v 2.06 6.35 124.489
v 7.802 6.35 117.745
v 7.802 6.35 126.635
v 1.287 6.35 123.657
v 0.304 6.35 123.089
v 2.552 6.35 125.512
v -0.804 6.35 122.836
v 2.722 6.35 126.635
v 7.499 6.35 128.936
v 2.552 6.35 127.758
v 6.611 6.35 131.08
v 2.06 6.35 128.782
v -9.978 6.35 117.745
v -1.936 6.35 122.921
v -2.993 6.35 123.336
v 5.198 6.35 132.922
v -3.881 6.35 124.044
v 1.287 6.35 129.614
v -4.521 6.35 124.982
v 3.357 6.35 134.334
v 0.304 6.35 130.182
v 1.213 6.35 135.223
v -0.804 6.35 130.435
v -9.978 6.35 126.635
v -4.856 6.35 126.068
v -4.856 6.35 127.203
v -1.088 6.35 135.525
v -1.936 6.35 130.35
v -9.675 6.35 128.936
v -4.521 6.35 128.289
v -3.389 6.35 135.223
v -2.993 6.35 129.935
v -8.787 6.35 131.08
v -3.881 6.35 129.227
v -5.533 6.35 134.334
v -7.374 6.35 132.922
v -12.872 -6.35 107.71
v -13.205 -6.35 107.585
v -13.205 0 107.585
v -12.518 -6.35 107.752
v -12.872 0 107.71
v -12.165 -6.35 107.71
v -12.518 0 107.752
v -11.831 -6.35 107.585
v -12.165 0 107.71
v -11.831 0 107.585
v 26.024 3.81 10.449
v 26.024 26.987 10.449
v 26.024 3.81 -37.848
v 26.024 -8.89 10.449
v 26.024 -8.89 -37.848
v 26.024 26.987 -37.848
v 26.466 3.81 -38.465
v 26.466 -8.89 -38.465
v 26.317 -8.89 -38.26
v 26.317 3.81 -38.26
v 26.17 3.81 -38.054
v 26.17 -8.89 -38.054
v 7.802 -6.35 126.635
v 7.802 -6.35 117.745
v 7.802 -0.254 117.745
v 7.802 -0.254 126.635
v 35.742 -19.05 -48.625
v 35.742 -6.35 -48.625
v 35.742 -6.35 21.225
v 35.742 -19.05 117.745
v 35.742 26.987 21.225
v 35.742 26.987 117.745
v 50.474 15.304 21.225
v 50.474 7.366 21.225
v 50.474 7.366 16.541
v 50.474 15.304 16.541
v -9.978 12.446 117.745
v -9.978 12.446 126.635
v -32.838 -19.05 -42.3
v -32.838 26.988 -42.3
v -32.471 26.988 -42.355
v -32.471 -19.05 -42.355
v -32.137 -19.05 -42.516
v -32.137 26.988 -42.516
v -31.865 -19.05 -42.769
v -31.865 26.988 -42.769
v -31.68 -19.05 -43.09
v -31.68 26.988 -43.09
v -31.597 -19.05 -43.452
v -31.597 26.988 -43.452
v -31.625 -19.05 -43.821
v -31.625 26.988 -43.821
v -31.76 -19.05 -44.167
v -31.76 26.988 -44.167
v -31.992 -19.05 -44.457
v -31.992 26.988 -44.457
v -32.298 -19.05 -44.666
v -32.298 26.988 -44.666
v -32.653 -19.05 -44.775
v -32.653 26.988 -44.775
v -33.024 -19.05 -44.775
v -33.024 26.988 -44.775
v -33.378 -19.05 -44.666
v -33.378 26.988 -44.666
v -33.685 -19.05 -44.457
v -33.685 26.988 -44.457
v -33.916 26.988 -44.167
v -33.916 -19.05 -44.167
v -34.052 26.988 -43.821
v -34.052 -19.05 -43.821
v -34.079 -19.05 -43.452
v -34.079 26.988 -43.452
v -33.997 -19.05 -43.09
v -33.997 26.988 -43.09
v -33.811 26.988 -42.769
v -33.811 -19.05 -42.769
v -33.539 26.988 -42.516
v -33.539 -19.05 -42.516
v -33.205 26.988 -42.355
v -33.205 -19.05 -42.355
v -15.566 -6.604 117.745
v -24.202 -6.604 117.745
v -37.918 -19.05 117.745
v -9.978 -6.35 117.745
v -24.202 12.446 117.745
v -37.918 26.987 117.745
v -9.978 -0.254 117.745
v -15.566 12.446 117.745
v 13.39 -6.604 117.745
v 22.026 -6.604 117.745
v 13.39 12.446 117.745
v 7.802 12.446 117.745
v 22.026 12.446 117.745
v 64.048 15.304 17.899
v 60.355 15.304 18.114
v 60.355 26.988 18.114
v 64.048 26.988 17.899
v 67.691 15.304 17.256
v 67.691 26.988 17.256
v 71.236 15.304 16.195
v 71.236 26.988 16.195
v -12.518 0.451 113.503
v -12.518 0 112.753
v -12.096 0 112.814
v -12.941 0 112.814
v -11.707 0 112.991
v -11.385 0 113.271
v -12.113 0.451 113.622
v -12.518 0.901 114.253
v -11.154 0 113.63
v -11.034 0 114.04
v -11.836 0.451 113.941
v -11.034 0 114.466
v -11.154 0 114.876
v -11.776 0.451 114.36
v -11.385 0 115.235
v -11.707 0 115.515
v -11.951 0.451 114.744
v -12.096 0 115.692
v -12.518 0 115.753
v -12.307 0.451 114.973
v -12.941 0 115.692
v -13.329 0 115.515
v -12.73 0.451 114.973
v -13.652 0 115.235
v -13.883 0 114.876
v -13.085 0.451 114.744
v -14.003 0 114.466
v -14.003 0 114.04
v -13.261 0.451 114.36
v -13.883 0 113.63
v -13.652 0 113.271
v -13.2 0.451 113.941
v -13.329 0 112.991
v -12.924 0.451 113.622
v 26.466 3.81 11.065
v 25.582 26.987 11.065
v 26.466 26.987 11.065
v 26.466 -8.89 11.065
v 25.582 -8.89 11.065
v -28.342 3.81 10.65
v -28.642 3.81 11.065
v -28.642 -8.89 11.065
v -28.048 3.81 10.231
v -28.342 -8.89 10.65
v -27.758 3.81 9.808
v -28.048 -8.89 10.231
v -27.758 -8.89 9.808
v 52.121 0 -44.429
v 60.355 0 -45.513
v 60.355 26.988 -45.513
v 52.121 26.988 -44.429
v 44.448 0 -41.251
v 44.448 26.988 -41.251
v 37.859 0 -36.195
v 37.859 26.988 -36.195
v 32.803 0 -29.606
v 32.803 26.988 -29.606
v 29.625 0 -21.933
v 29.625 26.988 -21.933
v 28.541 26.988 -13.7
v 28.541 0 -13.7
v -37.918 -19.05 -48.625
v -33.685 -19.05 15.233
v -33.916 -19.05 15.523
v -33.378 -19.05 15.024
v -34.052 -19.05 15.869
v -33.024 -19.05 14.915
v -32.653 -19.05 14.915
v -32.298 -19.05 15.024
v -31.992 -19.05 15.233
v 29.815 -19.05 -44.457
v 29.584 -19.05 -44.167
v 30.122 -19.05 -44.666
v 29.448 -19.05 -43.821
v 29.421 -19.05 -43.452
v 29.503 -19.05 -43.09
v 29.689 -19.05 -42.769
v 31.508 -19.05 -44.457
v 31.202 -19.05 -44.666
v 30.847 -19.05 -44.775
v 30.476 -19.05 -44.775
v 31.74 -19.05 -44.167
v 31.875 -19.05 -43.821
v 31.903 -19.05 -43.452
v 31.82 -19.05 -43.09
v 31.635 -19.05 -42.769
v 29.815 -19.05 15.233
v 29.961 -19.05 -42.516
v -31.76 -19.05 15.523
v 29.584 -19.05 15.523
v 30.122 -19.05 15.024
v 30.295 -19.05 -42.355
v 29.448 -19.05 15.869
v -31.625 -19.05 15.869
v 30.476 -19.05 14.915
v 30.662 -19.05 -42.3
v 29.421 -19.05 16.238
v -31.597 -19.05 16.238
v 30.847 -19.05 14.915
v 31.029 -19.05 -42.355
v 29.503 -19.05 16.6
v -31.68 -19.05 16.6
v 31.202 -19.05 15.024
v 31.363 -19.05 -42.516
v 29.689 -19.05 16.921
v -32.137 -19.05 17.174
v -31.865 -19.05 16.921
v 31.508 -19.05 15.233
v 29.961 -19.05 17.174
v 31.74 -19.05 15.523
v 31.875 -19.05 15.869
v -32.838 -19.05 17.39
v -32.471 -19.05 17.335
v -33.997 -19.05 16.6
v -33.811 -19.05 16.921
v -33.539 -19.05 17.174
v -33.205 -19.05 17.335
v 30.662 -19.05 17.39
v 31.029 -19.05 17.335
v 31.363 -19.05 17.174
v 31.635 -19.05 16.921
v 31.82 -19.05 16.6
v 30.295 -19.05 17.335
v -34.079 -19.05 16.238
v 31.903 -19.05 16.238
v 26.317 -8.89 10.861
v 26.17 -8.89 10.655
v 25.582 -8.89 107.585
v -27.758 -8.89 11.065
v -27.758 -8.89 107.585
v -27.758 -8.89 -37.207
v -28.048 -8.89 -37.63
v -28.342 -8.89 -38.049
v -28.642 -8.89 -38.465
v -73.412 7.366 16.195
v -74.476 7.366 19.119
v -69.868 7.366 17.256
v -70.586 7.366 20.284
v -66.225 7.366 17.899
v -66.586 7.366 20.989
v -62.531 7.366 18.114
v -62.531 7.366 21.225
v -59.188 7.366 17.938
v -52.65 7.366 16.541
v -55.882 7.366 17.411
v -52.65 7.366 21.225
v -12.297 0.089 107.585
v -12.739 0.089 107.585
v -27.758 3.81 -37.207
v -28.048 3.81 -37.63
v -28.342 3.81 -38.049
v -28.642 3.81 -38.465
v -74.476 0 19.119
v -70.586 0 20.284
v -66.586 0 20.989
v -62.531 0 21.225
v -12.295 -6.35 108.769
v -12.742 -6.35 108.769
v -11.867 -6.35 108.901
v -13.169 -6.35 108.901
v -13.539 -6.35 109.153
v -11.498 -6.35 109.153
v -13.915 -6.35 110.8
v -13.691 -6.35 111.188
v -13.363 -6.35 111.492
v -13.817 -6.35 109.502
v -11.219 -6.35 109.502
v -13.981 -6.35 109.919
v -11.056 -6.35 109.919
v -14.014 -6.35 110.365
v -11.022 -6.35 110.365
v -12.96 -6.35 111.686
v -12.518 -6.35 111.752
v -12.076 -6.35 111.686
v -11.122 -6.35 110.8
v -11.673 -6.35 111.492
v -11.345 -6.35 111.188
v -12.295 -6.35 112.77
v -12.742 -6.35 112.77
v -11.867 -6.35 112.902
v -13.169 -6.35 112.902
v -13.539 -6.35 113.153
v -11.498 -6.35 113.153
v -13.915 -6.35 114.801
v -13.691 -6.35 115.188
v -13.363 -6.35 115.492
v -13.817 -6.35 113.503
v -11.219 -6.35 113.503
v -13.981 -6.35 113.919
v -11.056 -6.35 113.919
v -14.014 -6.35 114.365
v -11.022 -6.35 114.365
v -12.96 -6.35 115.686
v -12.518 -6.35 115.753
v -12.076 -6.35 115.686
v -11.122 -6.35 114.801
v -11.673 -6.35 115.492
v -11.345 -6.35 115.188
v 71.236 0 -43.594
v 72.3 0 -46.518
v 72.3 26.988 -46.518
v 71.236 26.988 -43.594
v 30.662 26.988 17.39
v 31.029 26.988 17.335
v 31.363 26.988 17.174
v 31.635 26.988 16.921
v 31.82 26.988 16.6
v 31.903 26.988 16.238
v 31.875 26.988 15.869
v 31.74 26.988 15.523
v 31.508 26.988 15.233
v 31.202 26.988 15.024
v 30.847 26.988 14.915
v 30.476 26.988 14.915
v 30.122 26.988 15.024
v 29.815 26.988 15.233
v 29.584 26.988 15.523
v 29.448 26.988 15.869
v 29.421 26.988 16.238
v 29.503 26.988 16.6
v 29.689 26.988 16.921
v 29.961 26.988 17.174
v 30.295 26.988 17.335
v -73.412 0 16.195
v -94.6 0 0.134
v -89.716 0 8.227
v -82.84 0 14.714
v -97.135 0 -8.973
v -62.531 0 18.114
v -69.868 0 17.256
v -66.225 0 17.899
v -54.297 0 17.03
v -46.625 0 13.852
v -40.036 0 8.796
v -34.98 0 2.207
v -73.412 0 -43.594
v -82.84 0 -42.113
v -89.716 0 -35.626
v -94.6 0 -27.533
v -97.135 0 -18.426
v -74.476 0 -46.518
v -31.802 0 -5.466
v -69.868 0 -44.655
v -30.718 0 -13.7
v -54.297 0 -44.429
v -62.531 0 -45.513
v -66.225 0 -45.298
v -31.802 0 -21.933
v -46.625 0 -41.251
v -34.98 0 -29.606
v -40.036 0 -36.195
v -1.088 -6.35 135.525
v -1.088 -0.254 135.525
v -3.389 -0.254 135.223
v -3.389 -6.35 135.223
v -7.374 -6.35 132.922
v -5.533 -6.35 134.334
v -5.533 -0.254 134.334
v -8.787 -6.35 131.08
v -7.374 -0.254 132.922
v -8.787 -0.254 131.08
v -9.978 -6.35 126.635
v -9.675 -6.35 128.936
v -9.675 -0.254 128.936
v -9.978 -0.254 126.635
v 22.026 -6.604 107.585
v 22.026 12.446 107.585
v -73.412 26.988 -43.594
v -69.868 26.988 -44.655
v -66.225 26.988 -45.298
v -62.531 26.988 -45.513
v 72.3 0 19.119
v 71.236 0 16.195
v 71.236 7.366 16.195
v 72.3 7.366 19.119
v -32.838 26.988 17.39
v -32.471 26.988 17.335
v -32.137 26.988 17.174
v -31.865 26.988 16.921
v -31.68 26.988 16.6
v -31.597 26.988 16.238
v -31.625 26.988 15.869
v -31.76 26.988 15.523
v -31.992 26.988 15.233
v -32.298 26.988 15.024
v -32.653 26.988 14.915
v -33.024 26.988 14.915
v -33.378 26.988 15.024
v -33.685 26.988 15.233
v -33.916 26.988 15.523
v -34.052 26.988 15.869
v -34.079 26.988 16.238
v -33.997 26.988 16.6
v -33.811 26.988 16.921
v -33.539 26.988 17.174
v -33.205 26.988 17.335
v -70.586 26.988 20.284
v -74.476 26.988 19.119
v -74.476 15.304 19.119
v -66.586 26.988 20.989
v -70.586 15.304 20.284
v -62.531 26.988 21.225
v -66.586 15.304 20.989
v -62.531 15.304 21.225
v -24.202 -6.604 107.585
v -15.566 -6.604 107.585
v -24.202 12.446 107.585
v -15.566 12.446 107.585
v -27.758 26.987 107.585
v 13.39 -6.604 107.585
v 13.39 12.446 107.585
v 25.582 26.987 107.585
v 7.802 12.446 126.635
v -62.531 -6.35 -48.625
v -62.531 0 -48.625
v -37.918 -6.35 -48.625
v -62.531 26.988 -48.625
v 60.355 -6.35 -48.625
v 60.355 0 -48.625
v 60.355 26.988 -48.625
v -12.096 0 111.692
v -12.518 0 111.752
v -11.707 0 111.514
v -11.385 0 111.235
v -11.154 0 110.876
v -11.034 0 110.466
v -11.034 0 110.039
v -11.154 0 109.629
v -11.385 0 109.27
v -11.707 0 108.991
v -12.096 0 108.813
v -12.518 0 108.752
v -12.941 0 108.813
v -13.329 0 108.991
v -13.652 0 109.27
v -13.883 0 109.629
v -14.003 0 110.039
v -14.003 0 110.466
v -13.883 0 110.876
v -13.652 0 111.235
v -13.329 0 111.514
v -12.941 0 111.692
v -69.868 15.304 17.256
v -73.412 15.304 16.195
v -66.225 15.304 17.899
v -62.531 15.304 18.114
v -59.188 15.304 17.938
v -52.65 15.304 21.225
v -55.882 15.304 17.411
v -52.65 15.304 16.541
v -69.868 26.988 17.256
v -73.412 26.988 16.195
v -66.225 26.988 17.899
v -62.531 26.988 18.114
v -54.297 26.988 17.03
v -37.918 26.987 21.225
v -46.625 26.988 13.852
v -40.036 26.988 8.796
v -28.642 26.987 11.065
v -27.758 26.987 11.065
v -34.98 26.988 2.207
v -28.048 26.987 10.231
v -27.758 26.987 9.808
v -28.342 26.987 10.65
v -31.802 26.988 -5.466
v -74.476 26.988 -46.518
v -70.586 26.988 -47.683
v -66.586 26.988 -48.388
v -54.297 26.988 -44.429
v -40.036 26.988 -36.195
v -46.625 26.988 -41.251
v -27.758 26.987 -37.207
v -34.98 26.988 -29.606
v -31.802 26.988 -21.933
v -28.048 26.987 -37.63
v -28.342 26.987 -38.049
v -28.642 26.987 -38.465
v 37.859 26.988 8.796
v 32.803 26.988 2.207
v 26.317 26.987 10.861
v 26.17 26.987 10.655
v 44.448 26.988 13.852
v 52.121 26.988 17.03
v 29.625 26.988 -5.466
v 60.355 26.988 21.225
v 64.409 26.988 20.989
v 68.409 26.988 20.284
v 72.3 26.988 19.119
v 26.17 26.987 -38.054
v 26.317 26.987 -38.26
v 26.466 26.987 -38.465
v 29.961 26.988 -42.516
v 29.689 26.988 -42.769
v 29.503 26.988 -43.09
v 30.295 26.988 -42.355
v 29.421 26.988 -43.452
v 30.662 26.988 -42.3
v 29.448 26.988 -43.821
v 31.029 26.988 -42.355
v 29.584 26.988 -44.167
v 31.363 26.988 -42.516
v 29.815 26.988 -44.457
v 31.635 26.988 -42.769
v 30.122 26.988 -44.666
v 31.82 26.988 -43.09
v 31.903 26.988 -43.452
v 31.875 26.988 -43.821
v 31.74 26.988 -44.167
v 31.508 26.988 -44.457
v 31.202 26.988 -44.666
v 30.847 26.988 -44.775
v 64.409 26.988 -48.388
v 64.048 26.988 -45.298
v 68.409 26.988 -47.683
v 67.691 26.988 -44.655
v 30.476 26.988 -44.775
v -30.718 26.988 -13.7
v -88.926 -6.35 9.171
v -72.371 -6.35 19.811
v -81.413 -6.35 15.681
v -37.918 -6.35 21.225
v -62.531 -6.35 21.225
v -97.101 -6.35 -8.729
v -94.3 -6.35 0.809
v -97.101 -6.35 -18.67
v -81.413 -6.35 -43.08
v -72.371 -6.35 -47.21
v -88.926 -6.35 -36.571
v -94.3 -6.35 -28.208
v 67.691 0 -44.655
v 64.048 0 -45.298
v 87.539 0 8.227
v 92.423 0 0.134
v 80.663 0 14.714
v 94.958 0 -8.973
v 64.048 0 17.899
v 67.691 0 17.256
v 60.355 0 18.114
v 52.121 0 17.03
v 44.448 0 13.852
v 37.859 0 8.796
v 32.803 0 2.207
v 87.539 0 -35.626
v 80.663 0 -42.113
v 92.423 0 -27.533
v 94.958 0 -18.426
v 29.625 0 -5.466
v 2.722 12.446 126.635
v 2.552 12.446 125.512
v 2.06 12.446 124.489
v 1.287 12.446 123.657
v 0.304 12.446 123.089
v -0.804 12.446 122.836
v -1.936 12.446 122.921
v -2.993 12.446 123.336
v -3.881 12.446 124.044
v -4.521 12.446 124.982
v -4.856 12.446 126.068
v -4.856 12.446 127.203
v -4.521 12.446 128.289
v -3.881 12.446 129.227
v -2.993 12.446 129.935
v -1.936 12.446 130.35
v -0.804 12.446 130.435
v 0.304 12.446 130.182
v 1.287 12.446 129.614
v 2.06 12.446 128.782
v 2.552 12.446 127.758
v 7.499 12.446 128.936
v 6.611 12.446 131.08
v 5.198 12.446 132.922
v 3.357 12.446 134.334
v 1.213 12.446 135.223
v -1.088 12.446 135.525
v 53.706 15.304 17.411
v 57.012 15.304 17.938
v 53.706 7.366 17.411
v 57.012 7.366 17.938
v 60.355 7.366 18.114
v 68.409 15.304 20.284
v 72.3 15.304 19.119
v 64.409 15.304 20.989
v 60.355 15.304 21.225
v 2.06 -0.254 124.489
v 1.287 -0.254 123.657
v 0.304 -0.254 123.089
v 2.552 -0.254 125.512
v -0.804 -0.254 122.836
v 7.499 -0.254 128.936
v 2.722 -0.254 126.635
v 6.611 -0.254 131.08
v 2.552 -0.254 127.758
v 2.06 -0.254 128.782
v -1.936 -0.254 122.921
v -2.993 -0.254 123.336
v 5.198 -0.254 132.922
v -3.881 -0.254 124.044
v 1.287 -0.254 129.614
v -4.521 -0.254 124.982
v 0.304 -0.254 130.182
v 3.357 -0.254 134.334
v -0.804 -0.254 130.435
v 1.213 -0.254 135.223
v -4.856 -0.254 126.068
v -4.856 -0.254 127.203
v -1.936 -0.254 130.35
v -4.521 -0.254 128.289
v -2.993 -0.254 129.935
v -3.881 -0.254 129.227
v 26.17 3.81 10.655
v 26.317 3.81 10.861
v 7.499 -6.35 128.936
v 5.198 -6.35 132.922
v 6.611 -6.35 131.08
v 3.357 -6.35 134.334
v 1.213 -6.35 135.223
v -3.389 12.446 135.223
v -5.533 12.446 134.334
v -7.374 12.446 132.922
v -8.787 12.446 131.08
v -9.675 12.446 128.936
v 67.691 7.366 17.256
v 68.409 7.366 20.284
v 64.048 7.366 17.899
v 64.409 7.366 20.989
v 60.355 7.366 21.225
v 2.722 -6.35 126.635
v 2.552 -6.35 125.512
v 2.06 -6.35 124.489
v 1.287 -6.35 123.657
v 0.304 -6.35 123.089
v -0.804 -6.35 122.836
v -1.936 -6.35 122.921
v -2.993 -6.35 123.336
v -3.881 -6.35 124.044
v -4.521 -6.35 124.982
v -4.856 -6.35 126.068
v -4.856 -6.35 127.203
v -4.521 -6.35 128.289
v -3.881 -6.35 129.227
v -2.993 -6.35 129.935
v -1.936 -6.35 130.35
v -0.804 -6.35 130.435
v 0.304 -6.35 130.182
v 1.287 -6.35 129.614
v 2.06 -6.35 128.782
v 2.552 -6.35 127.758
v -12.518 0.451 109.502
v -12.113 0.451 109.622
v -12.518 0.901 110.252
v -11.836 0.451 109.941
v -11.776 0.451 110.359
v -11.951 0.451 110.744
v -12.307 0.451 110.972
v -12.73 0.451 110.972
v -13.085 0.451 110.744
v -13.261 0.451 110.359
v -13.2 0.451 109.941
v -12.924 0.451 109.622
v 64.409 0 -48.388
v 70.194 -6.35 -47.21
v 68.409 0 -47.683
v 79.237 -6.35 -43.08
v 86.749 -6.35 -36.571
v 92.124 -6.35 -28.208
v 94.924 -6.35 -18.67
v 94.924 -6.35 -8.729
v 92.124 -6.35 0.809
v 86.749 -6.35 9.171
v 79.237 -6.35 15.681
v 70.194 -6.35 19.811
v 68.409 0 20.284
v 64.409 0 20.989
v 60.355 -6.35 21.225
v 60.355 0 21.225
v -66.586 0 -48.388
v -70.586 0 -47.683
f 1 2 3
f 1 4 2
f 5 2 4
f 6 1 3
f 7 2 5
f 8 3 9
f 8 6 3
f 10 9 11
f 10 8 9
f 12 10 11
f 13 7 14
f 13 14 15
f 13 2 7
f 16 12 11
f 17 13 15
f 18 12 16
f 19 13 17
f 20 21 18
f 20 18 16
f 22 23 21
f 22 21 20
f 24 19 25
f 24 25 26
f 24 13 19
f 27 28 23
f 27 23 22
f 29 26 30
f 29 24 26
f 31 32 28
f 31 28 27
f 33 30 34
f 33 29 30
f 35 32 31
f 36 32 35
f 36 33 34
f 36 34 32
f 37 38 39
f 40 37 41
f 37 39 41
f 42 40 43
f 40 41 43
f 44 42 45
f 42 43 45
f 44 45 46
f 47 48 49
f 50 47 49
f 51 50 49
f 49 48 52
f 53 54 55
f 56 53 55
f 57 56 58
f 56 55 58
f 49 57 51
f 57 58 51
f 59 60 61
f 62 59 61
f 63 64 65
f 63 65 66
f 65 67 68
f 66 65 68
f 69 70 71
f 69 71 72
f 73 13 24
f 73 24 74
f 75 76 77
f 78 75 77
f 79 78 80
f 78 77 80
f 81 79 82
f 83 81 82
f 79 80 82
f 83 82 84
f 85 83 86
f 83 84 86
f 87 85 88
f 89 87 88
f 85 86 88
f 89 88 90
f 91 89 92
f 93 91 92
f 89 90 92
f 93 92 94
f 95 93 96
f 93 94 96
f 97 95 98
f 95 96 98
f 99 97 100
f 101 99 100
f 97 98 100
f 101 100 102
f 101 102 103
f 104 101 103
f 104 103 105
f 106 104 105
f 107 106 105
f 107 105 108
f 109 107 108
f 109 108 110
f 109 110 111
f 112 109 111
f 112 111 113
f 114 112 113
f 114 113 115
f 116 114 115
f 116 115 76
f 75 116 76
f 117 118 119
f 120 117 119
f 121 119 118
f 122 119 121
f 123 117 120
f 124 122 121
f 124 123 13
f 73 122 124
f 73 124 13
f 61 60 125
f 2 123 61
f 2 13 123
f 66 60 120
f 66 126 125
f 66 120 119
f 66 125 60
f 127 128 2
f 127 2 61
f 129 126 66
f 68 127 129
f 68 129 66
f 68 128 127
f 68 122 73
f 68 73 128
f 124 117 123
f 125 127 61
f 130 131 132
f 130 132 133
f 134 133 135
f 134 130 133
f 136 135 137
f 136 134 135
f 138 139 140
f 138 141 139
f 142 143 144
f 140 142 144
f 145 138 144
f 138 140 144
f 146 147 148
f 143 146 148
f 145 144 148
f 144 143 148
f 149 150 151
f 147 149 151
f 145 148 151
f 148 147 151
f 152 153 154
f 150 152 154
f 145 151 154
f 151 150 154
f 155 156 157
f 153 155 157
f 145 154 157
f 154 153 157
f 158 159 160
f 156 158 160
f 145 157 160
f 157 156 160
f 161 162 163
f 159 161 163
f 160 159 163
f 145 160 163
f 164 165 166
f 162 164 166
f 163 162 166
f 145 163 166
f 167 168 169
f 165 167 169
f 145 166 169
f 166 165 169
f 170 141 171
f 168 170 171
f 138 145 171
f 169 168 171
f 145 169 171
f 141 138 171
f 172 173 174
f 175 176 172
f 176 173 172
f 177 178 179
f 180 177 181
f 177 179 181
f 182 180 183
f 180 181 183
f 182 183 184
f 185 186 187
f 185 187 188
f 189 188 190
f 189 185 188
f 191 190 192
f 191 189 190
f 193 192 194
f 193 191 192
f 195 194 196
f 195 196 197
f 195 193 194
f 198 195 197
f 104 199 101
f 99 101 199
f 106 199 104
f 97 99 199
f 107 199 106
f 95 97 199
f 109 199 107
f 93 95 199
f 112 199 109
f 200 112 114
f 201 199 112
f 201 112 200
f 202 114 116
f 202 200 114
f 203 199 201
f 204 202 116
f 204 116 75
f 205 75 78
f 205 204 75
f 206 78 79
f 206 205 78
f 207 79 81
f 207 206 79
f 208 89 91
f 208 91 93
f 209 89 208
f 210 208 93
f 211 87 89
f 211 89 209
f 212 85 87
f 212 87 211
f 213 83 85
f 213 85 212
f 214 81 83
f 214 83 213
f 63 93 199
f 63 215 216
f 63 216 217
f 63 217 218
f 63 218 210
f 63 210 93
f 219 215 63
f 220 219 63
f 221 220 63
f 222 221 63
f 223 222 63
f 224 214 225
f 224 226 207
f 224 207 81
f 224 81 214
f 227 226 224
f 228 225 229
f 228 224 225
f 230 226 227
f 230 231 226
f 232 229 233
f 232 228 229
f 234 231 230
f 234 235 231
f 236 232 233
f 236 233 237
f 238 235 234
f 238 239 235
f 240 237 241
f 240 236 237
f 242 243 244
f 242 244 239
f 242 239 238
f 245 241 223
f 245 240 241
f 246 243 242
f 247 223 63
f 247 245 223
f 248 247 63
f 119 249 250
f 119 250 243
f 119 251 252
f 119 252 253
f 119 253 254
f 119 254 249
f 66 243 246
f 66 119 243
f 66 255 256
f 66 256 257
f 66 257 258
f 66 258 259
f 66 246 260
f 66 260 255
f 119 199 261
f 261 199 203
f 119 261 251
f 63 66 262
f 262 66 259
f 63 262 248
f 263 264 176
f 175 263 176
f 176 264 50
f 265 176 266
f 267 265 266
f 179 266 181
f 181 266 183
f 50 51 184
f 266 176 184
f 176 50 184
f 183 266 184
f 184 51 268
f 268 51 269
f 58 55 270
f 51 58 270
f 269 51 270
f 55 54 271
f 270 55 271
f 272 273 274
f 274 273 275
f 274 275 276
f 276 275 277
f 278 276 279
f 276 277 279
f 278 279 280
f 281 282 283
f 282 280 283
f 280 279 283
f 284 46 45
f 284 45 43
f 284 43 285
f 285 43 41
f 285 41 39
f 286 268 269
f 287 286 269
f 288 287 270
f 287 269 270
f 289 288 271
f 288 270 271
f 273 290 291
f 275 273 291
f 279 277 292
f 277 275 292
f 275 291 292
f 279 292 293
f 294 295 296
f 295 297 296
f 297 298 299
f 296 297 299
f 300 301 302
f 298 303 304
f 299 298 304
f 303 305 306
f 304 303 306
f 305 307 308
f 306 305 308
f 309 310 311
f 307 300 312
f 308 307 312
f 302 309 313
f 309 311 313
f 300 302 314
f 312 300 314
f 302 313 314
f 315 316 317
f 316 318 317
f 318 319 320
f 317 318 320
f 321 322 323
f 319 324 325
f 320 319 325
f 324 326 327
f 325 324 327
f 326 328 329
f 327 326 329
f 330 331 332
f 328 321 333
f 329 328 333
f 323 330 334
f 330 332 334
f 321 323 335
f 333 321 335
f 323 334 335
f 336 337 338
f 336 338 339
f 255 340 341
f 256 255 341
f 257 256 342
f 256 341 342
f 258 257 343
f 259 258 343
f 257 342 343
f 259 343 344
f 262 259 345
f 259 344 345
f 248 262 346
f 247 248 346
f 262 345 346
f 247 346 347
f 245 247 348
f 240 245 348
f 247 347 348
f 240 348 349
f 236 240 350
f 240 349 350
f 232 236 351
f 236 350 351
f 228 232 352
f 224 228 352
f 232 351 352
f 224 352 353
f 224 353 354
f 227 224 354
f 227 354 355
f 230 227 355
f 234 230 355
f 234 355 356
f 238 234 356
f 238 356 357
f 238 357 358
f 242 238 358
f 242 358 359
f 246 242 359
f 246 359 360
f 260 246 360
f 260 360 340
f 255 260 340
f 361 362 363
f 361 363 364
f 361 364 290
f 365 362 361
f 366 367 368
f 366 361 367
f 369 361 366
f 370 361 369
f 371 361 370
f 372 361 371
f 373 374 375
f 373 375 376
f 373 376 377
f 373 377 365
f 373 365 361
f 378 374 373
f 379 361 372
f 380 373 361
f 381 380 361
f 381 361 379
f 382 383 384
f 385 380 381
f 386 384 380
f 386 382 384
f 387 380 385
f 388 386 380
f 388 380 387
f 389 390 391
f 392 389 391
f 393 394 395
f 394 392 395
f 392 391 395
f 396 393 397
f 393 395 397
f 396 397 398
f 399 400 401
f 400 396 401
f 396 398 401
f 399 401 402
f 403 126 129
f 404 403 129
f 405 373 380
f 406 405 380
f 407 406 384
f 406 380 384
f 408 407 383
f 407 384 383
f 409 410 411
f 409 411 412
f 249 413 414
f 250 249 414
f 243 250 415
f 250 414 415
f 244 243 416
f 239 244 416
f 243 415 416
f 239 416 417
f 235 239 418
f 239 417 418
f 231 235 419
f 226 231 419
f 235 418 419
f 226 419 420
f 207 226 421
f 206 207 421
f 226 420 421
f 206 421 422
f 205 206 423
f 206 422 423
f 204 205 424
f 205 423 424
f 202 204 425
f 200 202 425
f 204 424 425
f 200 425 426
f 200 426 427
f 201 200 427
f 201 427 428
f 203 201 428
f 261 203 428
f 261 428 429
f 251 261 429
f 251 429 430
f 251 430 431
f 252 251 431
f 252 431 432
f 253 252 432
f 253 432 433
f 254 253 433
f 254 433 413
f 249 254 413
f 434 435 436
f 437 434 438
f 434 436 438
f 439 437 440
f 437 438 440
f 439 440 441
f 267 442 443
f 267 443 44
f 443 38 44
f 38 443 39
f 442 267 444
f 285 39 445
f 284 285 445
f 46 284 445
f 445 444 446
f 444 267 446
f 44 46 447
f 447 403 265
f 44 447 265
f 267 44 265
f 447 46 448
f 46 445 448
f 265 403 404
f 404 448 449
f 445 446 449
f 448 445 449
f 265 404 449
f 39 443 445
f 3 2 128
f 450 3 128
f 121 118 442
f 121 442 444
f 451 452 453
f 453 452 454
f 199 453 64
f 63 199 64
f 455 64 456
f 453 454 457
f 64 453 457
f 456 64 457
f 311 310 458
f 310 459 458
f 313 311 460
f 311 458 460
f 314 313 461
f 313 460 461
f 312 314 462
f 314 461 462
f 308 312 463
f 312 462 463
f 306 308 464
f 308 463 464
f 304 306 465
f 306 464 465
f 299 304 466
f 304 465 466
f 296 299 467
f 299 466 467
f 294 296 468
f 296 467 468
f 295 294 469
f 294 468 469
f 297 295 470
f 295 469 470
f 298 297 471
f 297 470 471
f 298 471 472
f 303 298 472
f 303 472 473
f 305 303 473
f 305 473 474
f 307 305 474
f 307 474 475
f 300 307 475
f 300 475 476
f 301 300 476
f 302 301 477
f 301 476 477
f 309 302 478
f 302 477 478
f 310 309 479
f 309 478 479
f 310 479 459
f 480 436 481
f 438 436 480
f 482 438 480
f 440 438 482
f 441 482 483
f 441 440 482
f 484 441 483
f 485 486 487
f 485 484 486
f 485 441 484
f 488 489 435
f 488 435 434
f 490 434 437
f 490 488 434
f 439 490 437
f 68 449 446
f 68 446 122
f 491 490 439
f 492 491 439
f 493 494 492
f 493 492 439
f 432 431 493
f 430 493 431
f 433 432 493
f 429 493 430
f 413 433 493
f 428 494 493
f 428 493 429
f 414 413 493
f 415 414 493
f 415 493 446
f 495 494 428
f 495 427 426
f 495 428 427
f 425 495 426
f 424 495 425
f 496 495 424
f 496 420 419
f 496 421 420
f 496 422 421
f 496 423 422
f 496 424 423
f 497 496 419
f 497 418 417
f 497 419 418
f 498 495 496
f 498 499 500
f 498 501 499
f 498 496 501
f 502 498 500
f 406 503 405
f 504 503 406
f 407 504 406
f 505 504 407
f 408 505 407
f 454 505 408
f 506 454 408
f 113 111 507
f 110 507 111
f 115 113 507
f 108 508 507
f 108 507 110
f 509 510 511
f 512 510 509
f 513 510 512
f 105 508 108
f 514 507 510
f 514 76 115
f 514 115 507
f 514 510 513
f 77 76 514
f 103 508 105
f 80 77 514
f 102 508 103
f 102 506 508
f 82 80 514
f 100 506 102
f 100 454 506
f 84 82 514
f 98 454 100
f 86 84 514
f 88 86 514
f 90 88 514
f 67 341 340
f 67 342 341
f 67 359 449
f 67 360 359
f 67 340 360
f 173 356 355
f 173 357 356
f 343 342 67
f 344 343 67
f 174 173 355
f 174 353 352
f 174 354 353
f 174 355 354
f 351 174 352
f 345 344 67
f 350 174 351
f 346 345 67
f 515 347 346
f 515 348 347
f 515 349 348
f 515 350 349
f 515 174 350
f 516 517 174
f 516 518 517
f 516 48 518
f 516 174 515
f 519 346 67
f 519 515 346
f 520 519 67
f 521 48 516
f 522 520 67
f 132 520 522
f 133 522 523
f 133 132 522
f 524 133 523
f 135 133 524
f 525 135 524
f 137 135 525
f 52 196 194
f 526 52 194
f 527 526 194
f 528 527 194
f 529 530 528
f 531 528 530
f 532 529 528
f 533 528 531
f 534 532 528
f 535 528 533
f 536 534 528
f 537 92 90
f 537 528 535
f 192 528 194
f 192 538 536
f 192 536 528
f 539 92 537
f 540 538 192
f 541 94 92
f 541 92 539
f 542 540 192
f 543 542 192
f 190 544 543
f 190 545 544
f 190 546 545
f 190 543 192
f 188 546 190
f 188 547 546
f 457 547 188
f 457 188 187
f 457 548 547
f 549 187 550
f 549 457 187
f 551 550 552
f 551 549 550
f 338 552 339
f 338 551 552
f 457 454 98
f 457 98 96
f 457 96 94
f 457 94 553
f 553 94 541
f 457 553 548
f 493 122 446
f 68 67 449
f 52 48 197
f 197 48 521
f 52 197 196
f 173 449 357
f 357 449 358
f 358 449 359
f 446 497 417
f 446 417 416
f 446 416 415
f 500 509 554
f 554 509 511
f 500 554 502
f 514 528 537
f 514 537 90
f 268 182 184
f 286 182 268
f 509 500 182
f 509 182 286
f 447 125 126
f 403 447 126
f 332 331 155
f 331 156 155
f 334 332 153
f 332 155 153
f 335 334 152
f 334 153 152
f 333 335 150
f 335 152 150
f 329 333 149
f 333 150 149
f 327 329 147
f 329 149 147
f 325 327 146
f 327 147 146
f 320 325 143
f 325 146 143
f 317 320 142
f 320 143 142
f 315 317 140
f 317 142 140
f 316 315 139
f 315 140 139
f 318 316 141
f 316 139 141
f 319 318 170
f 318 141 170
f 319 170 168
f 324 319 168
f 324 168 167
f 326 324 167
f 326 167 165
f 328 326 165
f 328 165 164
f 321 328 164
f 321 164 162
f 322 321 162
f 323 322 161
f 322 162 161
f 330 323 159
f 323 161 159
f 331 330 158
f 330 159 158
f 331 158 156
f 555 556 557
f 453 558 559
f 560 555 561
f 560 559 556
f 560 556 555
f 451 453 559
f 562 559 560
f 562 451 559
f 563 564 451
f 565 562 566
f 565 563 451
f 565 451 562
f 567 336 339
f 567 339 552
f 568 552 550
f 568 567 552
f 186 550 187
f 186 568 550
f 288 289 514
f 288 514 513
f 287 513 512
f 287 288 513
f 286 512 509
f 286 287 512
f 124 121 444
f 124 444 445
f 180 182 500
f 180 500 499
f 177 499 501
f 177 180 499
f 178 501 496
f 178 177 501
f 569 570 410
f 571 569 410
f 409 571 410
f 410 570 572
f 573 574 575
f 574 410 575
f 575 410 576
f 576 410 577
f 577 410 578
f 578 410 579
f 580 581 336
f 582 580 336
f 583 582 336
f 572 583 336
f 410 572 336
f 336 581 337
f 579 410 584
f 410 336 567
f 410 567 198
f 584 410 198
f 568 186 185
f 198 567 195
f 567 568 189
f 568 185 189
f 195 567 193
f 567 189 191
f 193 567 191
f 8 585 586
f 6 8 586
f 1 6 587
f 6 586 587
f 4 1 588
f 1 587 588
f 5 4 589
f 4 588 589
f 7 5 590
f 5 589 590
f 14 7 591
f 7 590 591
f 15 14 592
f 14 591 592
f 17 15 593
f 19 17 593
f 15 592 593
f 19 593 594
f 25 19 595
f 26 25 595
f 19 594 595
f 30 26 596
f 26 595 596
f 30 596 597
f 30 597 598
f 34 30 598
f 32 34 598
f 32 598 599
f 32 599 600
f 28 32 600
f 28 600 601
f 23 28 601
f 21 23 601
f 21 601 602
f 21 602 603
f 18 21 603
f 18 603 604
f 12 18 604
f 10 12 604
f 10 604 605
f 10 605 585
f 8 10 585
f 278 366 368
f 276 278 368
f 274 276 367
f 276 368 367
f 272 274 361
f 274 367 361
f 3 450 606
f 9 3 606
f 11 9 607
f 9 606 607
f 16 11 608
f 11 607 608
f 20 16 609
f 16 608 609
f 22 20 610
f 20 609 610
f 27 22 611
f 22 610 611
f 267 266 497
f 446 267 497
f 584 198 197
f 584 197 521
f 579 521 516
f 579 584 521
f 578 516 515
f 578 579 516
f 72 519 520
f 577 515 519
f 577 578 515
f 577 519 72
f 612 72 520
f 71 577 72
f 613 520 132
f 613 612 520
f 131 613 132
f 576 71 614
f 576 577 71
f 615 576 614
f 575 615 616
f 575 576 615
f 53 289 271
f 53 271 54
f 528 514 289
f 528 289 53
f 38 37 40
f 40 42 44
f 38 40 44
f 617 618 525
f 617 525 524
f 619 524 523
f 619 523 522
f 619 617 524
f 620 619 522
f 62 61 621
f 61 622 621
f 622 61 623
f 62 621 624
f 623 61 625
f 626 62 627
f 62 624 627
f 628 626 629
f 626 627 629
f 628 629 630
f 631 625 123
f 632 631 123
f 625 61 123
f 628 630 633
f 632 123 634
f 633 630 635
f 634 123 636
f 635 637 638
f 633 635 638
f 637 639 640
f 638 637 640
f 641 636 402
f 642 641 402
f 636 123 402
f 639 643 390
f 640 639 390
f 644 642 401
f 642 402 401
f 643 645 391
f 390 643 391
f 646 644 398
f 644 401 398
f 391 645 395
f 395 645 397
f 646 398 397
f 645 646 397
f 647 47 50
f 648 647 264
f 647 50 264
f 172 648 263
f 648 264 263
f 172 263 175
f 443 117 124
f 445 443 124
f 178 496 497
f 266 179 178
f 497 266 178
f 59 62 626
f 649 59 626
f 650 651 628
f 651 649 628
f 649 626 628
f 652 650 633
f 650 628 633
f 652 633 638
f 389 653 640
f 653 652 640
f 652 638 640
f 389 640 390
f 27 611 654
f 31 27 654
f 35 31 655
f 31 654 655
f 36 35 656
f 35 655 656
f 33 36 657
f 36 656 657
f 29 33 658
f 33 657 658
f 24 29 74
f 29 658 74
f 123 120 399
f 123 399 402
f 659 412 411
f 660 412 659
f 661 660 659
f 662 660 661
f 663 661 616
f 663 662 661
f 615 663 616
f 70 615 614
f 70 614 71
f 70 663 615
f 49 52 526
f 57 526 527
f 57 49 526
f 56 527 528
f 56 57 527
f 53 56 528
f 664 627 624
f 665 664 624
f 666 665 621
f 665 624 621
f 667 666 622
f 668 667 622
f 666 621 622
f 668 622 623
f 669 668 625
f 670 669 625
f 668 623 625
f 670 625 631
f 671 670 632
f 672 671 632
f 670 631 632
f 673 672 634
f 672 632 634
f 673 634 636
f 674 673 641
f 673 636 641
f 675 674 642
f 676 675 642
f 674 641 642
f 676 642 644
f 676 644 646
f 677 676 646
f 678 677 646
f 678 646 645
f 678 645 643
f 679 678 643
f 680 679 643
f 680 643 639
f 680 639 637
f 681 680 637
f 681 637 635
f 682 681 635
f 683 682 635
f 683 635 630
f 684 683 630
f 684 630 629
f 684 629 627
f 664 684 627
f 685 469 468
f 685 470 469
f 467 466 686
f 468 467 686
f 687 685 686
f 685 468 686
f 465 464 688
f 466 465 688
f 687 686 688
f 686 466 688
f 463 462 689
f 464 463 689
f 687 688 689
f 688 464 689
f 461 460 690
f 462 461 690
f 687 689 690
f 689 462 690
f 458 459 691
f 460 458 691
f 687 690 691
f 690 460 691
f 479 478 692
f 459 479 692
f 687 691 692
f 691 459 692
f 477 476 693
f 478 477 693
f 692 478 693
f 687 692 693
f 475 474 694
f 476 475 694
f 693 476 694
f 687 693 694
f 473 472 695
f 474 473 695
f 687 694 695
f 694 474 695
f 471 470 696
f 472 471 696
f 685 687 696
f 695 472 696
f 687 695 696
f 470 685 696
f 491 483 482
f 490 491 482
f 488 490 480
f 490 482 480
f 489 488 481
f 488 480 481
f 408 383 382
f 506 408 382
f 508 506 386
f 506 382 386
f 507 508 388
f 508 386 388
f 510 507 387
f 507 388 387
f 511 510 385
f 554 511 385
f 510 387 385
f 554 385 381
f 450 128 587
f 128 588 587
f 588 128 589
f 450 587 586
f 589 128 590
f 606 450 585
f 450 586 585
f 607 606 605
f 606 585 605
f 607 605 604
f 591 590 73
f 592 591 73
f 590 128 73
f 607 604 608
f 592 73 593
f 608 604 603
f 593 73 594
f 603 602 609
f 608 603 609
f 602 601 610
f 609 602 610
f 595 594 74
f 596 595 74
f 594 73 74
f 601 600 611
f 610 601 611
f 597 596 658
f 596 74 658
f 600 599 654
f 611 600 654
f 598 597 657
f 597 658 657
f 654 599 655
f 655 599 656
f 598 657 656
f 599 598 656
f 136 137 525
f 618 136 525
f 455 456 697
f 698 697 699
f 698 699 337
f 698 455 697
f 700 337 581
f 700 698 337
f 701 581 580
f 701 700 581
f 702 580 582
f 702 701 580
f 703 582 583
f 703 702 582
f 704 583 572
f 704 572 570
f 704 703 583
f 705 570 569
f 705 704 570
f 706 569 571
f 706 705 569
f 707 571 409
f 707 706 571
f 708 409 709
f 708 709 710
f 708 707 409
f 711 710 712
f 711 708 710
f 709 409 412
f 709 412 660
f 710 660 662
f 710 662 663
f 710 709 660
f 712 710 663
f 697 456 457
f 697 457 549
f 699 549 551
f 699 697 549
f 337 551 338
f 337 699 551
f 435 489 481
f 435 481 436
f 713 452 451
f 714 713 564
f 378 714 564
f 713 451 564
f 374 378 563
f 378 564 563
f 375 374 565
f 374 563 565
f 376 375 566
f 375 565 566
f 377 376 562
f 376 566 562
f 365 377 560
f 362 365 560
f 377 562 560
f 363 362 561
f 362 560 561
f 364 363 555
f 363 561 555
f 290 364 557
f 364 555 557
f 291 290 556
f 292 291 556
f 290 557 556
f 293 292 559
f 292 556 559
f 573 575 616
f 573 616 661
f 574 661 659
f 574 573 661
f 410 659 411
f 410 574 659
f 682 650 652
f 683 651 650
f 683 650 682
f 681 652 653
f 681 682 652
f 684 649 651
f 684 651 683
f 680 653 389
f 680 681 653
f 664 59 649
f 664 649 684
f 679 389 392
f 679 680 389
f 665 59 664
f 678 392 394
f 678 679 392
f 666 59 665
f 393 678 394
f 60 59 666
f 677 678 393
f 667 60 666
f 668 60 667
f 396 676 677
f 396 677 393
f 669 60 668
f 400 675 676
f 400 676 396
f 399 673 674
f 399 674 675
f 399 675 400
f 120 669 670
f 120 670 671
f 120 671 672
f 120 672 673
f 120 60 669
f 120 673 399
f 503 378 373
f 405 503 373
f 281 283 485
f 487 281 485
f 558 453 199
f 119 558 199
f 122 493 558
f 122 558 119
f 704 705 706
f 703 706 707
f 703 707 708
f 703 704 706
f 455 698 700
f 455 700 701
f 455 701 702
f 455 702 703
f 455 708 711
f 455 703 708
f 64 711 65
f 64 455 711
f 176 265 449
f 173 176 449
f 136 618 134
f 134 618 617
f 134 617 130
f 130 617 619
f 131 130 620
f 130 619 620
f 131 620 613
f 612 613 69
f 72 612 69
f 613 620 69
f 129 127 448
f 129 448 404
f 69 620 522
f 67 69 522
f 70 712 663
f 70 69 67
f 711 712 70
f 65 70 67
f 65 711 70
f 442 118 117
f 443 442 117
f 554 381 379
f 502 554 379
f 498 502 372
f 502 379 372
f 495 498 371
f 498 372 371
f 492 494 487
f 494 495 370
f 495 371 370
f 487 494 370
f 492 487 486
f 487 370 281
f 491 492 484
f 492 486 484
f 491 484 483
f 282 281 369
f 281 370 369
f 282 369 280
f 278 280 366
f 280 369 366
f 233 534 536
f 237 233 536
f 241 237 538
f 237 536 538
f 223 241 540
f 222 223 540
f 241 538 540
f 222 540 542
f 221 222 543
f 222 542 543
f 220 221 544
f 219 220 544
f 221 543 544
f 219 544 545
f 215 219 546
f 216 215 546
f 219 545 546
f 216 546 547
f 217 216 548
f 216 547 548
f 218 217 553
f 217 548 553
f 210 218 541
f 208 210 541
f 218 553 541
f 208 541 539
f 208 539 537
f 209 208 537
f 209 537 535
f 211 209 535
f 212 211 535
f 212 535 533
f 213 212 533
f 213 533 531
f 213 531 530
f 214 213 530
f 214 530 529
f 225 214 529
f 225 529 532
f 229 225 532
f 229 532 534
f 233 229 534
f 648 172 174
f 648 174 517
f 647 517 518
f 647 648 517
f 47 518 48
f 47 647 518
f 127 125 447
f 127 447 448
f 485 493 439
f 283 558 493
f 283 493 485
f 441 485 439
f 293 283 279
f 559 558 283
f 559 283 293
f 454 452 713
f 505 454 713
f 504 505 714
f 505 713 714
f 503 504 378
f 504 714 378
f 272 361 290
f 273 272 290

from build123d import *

# Parameters (mm, degrees)
BOSS_EXTRUDE1_DEPTH          = 26.9875
BOSS_EXTRUDE5_START          = -6.35
BOSS_EXTRUDE5_DEPTH          = 6.35
SKETCH3_W                    = 36.83
SKETCH3_H                    = 33.3375
BOSS_EXTRUDE7_DEPTH          = 96.52
SKETCH6_W                    = 8.89
SKETCH6_H                    = 33.3375
BOSS_EXTRUDE8_DEPTH          = 17.78
SKETCH7_W                    = 17.78
SKETCH7_H                    = 14.5415
SKETCH7_H_2                  = 6.604
CUT_EXTRUDE1_DEPTH           = 21.082
CUT_EXTRUDE2_DEPTH           = 30.48
F_3_0_3_DIAMETER_HOLE1_D     = 3
F_3_0_3_DIAMETER_HOLE1_DEPTH = 6.35
F_3_0_3_DIAMETER_HOLE1_TIP   = 0.901290929
SKETCH11_W                   = 25.093710248
SKETCH11_H                   = 7.9375
CUT_EXTRUDE3_DEPTH           = 13.716
SHELL1_START                 = -38.464523808
SHELL1_OUTLINE_W             = 53.34
SHELL1_OUTLINE_H             = 23.1775
SHELL1_DEPTH                 = 146.05
SHELL1_START_2               = 3.81
SHELL1_3_DEPTH               = 23.1775
SHELL1_4_DEPTH               = 23.1775
SKETCH14_W                   = 53.34
SKETCH14_H                   = 23.1775
CUT_EXTRUDE5_DEPTH           = 18.288
SKETCH16_W                   = 73.66
SKETCH16_H                   = 166.37
BOSS_EXTRUDE9_DEPTH          = 12.7
CUT_EXTRUDE6_START           = -12.7
CUT_EXTRUDE6_DEPTH           = 12.7
SKETCH18_W                   = 8.636
SKETCH18_H                   = 19.05
CUT_EXTRUDE7_DEPTH           = 20.828
SKETCH13_R                   = 1.2446
CUT_EXTRUDE4_DEPTH           = 50.8
SKETCH20_W                   = 53.781966305
SKETCH20_H                   = 49.53
CUT_EXTRUDE8_DEPTH           = 35.8775


with BuildPart() as part:
    # Sketch1 → Boss-Extrude1 (new body)
    with BuildSketch(Plane(origin=(0, 0, 0), x_dir=(1, 0, 0), z_dir=(0, 1, 0))):
        with BuildLine():
            ThreePointArc((-27.606252307, 13.699523808), (-37.835547974, 38.395228141), (-62.531252307, 48.624523808))
            Line((-62.531252307, 48.624523808), (-62.531252307, 45.513023808))
            ThreePointArc((-62.531252307, 45.513023808), (-40.035710723, 36.195065391), (-30.717752307, 13.699523808))
            ThreePointArc((-30.717752307, 13.699523808), (-40.035710723, -8.796017775), (-62.531252307, -18.113976192))
            Line((-62.531252307, -18.113976192), (-62.531252307, -21.225476192))
            ThreePointArc((-62.531252307, -21.225476192), (-37.835547974, -10.996180525), (-27.606252307, 13.699523808))
        make_face()
        with BuildLine():
            Line((-62.531252307, 45.513023808), (-62.531252307, 48.624523808))
            ThreePointArc((-62.531252307, 48.624523808), (-68.595914912, 48.093934582), (-74.476305812, 46.518288589))
            Line((-74.476305812, 46.518288589), (-73.412110136, 43.594434999))
            ThreePointArc((-73.412110136, 43.594434999), (-68.055608607, 45.029705258), (-62.531252307, 45.513023808))
        make_face()
        with BuildLine():
            ThreePointArc((-74.476305812, -19.119240973), (-68.595914912, -20.694886966), (-62.531252307, -21.225476192))
            Line((-62.531252307, -21.225476192), (-62.531252307, -18.113976192))
            ThreePointArc((-62.531252307, -18.113976192), (-68.055608607, -17.630657643), (-73.412110136, -16.195387383))
            Line((-73.412110136, -16.195387383), (-74.476305812, -19.119240973))
        make_face()
        with BuildLine():
            Line((-1.088243621, 48.624523808), (-62.531252307, 48.624523808))
            ThreePointArc((-62.531252307, 48.624523808), (-37.835547974, 38.395228141), (-27.606252307, 13.699523808))
            ThreePointArc((-27.606252307, 13.699523808), (-37.835547974, -10.996180525), (-62.531252307, -21.225476192))
            Line((-62.531252307, -21.225476192), (-1.088243621, -21.225476192))
            Line((-1.088243621, -21.225476192), (-1.088243621, 48.624523808))
        make_face()
    boss_extrude1 = extrude(amount=BOSS_EXTRUDE1_DEPTH)

    # Sketch1<5> → Boss-Extrude5 (add)
    with BuildSketch(Plane(origin=(0, 0, 0), x_dir=(1, 0, 0), z_dir=(0, 1, 0)).offset(BOSS_EXTRUDE5_START)):
        with BuildLine():
            Line((-62.531252307, -21.225476192), (-1.088243621, -21.225476192))
            Line((-1.088243621, -21.225476192), (-1.088243621, 48.624523808))
            Line((-1.088243621, 48.624523808), (-62.531252307, 48.624523808))
            ThreePointArc((-62.531252307, 48.624523808), (-97.456252307, 13.699523808), (-62.531252307, -21.225476192))
        make_face()
    boss_extrude5 = extrude(amount=BOSS_EXTRUDE5_DEPTH)

    # Mirror1: Boss-Extrude1, Boss-Extrude5 across plane
    add(boss_extrude1.mirror(Plane(origin=(-1.088243621, 26.9875, 0), x_dir=(0, 0, 1), z_dir=(1, 0, 0))))
    add(boss_extrude5.mirror(Plane(origin=(-1.088243621, 26.9875, 0), x_dir=(0, 0, 1), z_dir=(1, 0, 0))))

    # Sketch3 → Boss-Extrude7 (add)
    with BuildSketch(Plane.XY.offset(21.225476192)):
        with Locations((-19.503243621, 10.31875)):
            Rectangle(SKETCH3_W, SKETCH3_H)
        with Locations((17.326756379, 10.31875)):
            Rectangle(SKETCH3_W, SKETCH3_H)
    extrude(amount=BOSS_EXTRUDE7_DEPTH)

    # Sketch6 → Boss-Extrude8 (add)
    with BuildSketch(Plane.XY.offset(117.745476192)):
        with Locations((-5.533243621, 10.31875)):
            Rectangle(SKETCH6_W, SKETCH6_H)
        with Locations((3.356756379, 10.31875)):
            Rectangle(SKETCH6_W, SKETCH6_H)
    extrude(amount=BOSS_EXTRUDE8_DEPTH)

    # Sketch7 → Cut-Extrude1 (cut)
    with BuildSketch(Plane.ZY.offset(9.978243621)):
        with Locations((126.635476192, 19.71675)):
            Rectangle(SKETCH7_W, SKETCH7_H)
        with Locations((126.635476192, 3.048)):
            Rectangle(SKETCH7_W, SKETCH7_H_2)
    extrude(amount=-CUT_EXTRUDE1_DEPTH, mode=Mode.SUBTRACT)

    # Sketch8 → Cut-Extrude2 (cut)
    with BuildSketch(Plane(origin=(0, 12.446, 0), x_dir=(1, 0, 0), z_dir=(0, 1, 0))):
        with BuildLine():
            Line((-9.978243621, -135.525476192), (-1.088243621, -135.525476192))
            ThreePointArc((-1.088243621, -135.525476192), (-7.374422906, -132.921655477), (-9.978243621, -126.635476192))
            Line((-9.978243621, -126.635476192), (-9.978243621, -135.525476192))
        make_face()
        with BuildLine():
            Line((7.801756379, -135.525476192), (7.801756379, -126.635476192))
            ThreePointArc((7.801756379, -126.635476192), (5.197935664, -132.921655477), (-1.088243621, -135.525476192))
            Line((-1.088243621, -135.525476192), (7.801756379, -135.525476192))
        make_face()
        with BuildLine():
            ThreePointArc((-4.898243621, -126.635476192), (-1.088243621, -130.445476192), (2.721756379, -126.635476192))
            Line((2.721756379, -126.635476192), (-4.898243621, -126.635476192))
        make_face()
        with BuildLine():
            Line((-4.898243621, -126.635476192), (2.721756379, -126.635476192))
            ThreePointArc((2.721756379, -126.635476192), (-1.088243621, -122.825476192), (-4.898243621, -126.635476192))
        make_face()
    extrude(amount=-CUT_EXTRUDE2_DEPTH, mode=Mode.SUBTRACT)

    # Ø3.0 (3) Diameter Hole1
    with Locations(Plane(origin=(-12.518243621, -6.35, 114.252976192), x_dir=(0, 0, -1), z_dir=(0, -1, 0))):
        with Locations((0, 0), (4.0005, 0), (8.001, 0)):
            Hole(F_3_0_3_DIAMETER_HOLE1_D / 2, depth=F_3_0_3_DIAMETER_HOLE1_DEPTH)
            with Locations((0, 0, -(F_3_0_3_DIAMETER_HOLE1_DEPTH + F_3_0_3_DIAMETER_HOLE1_TIP / 2))):  # 118° drill point
                Cone(0, F_3_0_3_DIAMETER_HOLE1_D / 2, F_3_0_3_DIAMETER_HOLE1_TIP, mode=Mode.SUBTRACT)

    # Sketch11 → Cut-Extrude3 (cut)
    with BuildSketch(Plane.XY.offset(21.225476192)):
        with Locations((-65.197098745, 11.33475)):
            Rectangle(SKETCH11_W, SKETCH11_H)
    cut_extrude3 = extrude(amount=-CUT_EXTRUDE3_DEPTH, mode=Mode.SUBTRACT)

    # Mirror2: Cut-Extrude3 across plane
    add(cut_extrude3.mirror(Plane.ZY.offset(1.088243621)), mode=Mode.SUBTRACT)

    # Shell1: read off the stored shape, not the designer's step
    # Shell1 outline → Shell1 (cut)
    with BuildSketch(Plane.XY.offset(SHELL1_START)):
        with Locations((-1.088243621, 15.39875)):
            Rectangle(SHELL1_OUTLINE_W, SHELL1_OUTLINE_H)
    extrude(amount=SHELL1_DEPTH, mode=Mode.SUBTRACT)

    # Shell1 2 outline → Shell1 2 (revolve)
    with BuildSketch(Plane(origin=(-12.518243621, 0, 106.251976192), x_dir=(1, 0, 0), z_dir=(0, 0, 1))):
        Polygon((11.66, 3.81), (11.66, 5.748251426), (0, 12.754286244), (0, 3.81), align=None)
    revolve(axis=Axis((-12.518243621, 0, 106.251976192), (0, 1, 0)))

    # Shell1 3 outline → Shell1 3 (cut)
    with BuildSketch(Plane(origin=(0, 0, 0), x_dir=(1, 0, 0), z_dir=(0, 1, 0)).offset(SHELL1_START_2)):
        with BuildLine():
            ThreePointArc((-27.758243621, -9.808189165), (-28.194454791, -10.440878812), (-28.642176231, -11.065476192))
            Line((-28.642176231, -11.065476192), (-27.758243621, -11.065476192))
            Line((-27.758243621, -11.065476192), (-27.758243621, -9.808189165))
        make_face()
        with BuildLine():
            ThreePointArc((26.46568899, -11.065476192), (26.01796755, -10.440878811), (25.581756379, -9.808189163))
            Line((25.581756379, -9.808189163), (25.581756379, -11.065476192))
            Line((25.581756379, -11.065476192), (26.46568899, -11.065476192))
        make_face()
        with BuildLine():
            Line((26.46568899, 38.464523808), (25.581756379, 38.464523808))
            Line((25.581756379, 38.464523808), (25.581756379, 37.207236779))
            ThreePointArc((25.581756379, 37.207236779), (26.01796755, 37.839926427), (26.46568899, 38.464523808))
        make_face()
        with BuildLine():
            ThreePointArc((-28.642176231, 38.464523808), (-28.194454791, 37.839926428), (-27.758243621, 37.207236781))
            Line((-27.758243621, 37.207236781), (-27.758243621, 38.464523808))
            Line((-27.758243621, 38.464523808), (-28.642176231, 38.464523808))
        make_face()
        with BuildLine():
            Line((-10.554813524, -117.745476192), (-14.481673718, -117.745476192))
            ThreePointArc((-14.481673718, -117.745476192), (-12.518243621, -117.911976192), (-10.554813524, -117.745476192))
        make_face()
    extrude(amount=SHELL1_3_DEPTH, mode=Mode.SUBTRACT)

    # Shell1 4 outline → Shell1 4 (add)
    with BuildSketch(Plane(origin=(0, 0, 0), x_dir=(1, 0, 0), z_dir=(0, 1, 0)).offset(SHELL1_START_2)):
        with BuildLine():
            Line((25.581756379, -9.808189163), (25.581756379, 37.207236779))
            ThreePointArc((25.581756379, 37.207236779), (18.381265065, 13.699523808), (25.581756379, -9.808189163))
        make_face()
        with BuildLine():
            Line((-27.758243621, 37.207236781), (-27.758243621, -9.808189165))
            ThreePointArc((-27.758243621, -9.808189165), (-20.557752307, 13.699523808), (-27.758243621, 37.207236781))
        make_face()
    extrude(amount=SHELL1_4_DEPTH)

    # Sketch14 → Cut-Extrude5 (cut)
    with BuildSketch(Plane(origin=(0, 0, 107.585476192), x_dir=(-1, 0, 0), z_dir=(0, 0, -1))):
        with Locations((1.088243621, 15.39875)):
            Rectangle(SKETCH14_W, SKETCH14_H)
    extrude(amount=CUT_EXTRUDE5_DEPTH, mode=Mode.SUBTRACT)

    # Sketch16 → Boss-Extrude9 (add)
    with BuildSketch(Plane.XZ.offset(6.35)):
        with Locations((-1.088243621, 34.560476192)):
            Rectangle(SKETCH16_W, SKETCH16_H)
    extrude(amount=BOSS_EXTRUDE9_DEPTH)

    # Sketch17 → Cut-Extrude6 (cut)
    with BuildSketch(Plane(origin=(0, 3.81, 0), x_dir=(1, 0, 0), z_dir=(0, 1, 0)).offset(CUT_EXTRUDE6_START)):
        with BuildLine():
            Line((-28.642176231, 38.464523808), (26.46568899, 38.464523808))
            ThreePointArc((26.46568899, 38.464523808), (18.381265065, 13.699523808), (26.46568899, -11.065476192))
            Line((26.46568899, -11.065476192), (25.581756379, -11.065476192))
            Line((25.581756379, -11.065476192), (25.581756379, -107.585476192))
            Line((25.581756379, -107.585476192), (-27.758243621, -107.585476192))
            Line((-27.758243621, -107.585476192), (-27.758243621, -11.065476192))
            Line((-27.758243621, -11.065476192), (-28.642176231, -11.065476192))
            ThreePointArc((-28.642176231, -11.065476192), (-20.557752307, 13.699523808), (-28.642176231, 38.464523808))
        make_face()
    extrude(amount=CUT_EXTRUDE6_DEPTH, mode=Mode.SUBTRACT)

    # Sketch18 → Cut-Extrude7 (cut)
    with BuildSketch(Plane.XY.offset(117.745476192)):
        with Locations((-19.884243621, 2.921)):
            Rectangle(SKETCH18_W, SKETCH18_H)
        with Locations((17.707756379, 2.921)):
            Rectangle(SKETCH18_W, SKETCH18_H)
    extrude(amount=-CUT_EXTRUDE7_DEPTH, mode=Mode.SUBTRACT)

    # Sketch13 → Cut-Extrude4 (cut)
    with BuildSketch(Plane(origin=(0, 26.9875, 0), x_dir=(1, 0, 0), z_dir=(0, 1, 0))):
        with Locations(Location((30.661756379, -16.145476192, 0), (0, 0, 270))):
            Circle(SKETCH13_R)
        with Locations(Location((-32.838243621, -16.145476192, 0), (0, 0, 270))):
            Circle(SKETCH13_R)
        with Locations(Location((-32.838243621, 43.544523808, 0), (0, 0, 270))):
            Circle(SKETCH13_R)
        with Locations(Location((30.661756379, 43.544523808, 0), (0, 0, 270))):
            Circle(SKETCH13_R)
    extrude(amount=-CUT_EXTRUDE4_DEPTH, mode=Mode.SUBTRACT)

    # Sketch20 → Cut-Extrude8 (cut)
    with BuildSketch(Plane(origin=(0, 26.9875, 0), x_dir=(1, 0, 0), z_dir=(0, 1, 0))):
        with Locations((-0.867260468, 13.699523808)):
            Rectangle(SKETCH20_W, SKETCH20_H)
    extrude(amount=-CUT_EXTRUDE8_DEPTH, mode=Mode.SUBTRACT)


solid = part.part
